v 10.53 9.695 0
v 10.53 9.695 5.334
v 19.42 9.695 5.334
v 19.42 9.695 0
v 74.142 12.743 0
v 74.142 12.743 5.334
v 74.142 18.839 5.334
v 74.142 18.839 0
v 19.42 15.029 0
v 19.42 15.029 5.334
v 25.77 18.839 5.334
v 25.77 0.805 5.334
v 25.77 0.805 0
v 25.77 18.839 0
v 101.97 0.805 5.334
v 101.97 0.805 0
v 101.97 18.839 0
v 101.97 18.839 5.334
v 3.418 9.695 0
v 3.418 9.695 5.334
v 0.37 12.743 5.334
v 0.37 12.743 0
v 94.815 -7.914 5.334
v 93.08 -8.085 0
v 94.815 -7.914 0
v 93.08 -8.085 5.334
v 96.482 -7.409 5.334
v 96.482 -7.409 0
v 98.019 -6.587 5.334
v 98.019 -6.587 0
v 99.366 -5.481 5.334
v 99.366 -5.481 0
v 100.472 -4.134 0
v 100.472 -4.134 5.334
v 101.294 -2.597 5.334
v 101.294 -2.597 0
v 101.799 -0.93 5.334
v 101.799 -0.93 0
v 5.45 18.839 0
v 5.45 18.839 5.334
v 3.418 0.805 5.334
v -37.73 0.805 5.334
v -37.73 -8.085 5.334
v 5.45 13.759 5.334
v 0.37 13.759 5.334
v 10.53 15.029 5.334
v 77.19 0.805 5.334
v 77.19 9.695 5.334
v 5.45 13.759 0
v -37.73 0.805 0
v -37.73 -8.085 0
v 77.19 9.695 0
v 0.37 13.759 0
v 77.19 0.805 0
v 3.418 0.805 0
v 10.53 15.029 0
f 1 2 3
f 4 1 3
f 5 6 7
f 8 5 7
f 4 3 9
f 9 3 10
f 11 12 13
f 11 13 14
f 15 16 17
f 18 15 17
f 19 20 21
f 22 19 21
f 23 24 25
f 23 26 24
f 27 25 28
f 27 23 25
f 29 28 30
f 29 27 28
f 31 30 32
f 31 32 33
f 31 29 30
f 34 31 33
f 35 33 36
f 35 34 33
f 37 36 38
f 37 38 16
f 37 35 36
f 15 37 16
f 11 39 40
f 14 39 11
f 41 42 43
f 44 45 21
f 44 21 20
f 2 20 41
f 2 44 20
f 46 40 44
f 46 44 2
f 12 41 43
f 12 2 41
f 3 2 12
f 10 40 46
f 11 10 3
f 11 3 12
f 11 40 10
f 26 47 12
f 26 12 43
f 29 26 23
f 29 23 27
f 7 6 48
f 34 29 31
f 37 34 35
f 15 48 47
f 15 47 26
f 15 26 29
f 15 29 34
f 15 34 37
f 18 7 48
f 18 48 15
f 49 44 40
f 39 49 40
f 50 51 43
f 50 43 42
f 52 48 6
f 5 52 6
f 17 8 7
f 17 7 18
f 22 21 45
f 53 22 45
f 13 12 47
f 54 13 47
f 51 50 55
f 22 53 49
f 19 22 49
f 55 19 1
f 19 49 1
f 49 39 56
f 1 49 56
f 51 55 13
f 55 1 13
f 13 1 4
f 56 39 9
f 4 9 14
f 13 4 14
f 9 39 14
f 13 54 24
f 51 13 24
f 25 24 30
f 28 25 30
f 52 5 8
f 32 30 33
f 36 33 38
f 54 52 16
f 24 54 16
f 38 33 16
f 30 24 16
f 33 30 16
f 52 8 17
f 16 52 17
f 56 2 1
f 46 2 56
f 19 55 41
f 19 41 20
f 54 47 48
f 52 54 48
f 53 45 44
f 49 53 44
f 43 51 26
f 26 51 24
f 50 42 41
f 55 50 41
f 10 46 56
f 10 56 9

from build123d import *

# Parameters (mm, degrees)
SKETCH1_W               = 139.7
SKETCH1_H               = 26.924
BOSS_EXTRUDE1_DEPTH     = 5.334
SKETCH2_W               = 38.1
SKETCH2_H               = 18.034
CUT_EXTRUDE1_DEPTH      = 104.832998003
SKETCH3_W               = 48.37176
SKETCH3_H               = 18.034
CUT_EXTRUDE3_DEPTH      = 104.832998003
SKETCH4_W               = 5.08
SKETCH4_H               = 5.08
CUT_EXTRUDE4_DEPTH      = 104.832998003
FILLET1_R               = 8.89
SKETCH5_W               = 8.89
SKETCH5_H               = 5.334
CUT_EXTRUDE5_DEPTH      = 104.832998003
SKETCH6_W               = 3.048
SKETCH6_H               = 8.89
CUT_EXTRUDE6_DEPTH      = 104.832998003
CUT_EXTRUDE7_DEPTH      = 104.832998003
CUT_EXTRUDE8_DEPTH      = 104.832998003
CUT_EXTRUDE9_DEPTH      = 104.832998003
CUT_EXTRUDE9_DEPTH_BACK = 104.832998003


with BuildPart() as part:
    # Sketch1 → Boss-Extrude1 (new body)
    with BuildSketch(Plane.XY):
        with Locations((32.120305114, 5.376704658)):
            Rectangle(SKETCH1_W, SKETCH1_H)
    extrude(amount=BOSS_EXTRUDE1_DEPTH)

    # Sketch2 → Cut-Extrude1 (cut, through all)
    with BuildSketch(Plane.XY.offset(5.334)):
        with Locations((-18.679694886, 9.821704658)):
            Rectangle(SKETCH2_W, SKETCH2_H)
    extrude(amount=-CUT_EXTRUDE1_DEPTH, mode=Mode.SUBTRACT)

    # Sketch3 → Cut-Extrude3 (cut, through all)
    with BuildSketch(Plane.XY.offset(5.334)):
        with Locations((49.956185114, 9.821704658)):
            Rectangle(SKETCH3_W, SKETCH3_H)
    extrude(amount=-CUT_EXTRUDE3_DEPTH, mode=Mode.SUBTRACT)

    # Sketch4 → Cut-Extrude4 (cut, through all)
    with BuildSketch(Plane.XY.offset(5.334)):
        with Locations((2.910305114, 16.298704658)):
            Rectangle(SKETCH4_W, SKETCH4_H)
    extrude(amount=-CUT_EXTRUDE4_DEPTH, mode=Mode.SUBTRACT)

    # Fillet1
    fillet1_edges = [part.edges().sort_by_distance(p)[0] for p in [
        (101.970305114, -8.085295342, 2.667),
    ]]
    fillet(fillet1_edges, radius=FILLET1_R)

    # Sketch5 → Cut-Extrude5 (cut, through all)
    with BuildSketch(Plane.XY.offset(5.334)):
        with Locations((14.975305114, 12.361704658)):
            Rectangle(SKETCH5_W, SKETCH5_H)
    extrude(amount=-CUT_EXTRUDE5_DEPTH, mode=Mode.SUBTRACT)

    # Sketch6 → Cut-Extrude6 (cut, through all)
    with BuildSketch(Plane.XY.offset(5.334)):
        with Locations((75.666065114, 5.249704658)):
            Rectangle(SKETCH6_W, SKETCH6_H)
    extrude(amount=-CUT_EXTRUDE6_DEPTH, mode=Mode.SUBTRACT)

    # Sketch7 → Cut-Extrude7 (cut, through all)
    with BuildSketch(Plane.XY.offset(5.334)):
        Polygon((77.190065114, 9.694704658), (74.142065114, 12.742704658), (74.142065114, 9.694704658), align=None)
    extrude(amount=-CUT_EXTRUDE7_DEPTH, mode=Mode.SUBTRACT)

    # Sketch8 → Cut-Extrude8 (cut, through all)
    with BuildSketch(Plane.XY.offset(5.334)):
        Polygon((0.370305114, 1.312704658), (3.418305114, 4.360704658), (3.418305114, 9.694704658), (0.370305114, 12.742704658), align=None)
    extrude(amount=-CUT_EXTRUDE8_DEPTH, mode=Mode.SUBTRACT)

    # Sketch9 → Cut-Extrude9 (cut, two sides: drawn at the far end of the back side and taken through both)
    with BuildSketch(Plane.XY.offset(5.334).offset(-CUT_EXTRUDE9_DEPTH_BACK)):
        Polygon((3.418305114, 0.804704658), (3.418305114, 4.360704658), (0.370305114, 1.312704658), (0.370305114, 0.804704658), align=None)
    extrude(amount=CUT_EXTRUDE9_DEPTH + CUT_EXTRUDE9_DEPTH_BACK, mode=Mode.SUBTRACT)


solid = part.part
